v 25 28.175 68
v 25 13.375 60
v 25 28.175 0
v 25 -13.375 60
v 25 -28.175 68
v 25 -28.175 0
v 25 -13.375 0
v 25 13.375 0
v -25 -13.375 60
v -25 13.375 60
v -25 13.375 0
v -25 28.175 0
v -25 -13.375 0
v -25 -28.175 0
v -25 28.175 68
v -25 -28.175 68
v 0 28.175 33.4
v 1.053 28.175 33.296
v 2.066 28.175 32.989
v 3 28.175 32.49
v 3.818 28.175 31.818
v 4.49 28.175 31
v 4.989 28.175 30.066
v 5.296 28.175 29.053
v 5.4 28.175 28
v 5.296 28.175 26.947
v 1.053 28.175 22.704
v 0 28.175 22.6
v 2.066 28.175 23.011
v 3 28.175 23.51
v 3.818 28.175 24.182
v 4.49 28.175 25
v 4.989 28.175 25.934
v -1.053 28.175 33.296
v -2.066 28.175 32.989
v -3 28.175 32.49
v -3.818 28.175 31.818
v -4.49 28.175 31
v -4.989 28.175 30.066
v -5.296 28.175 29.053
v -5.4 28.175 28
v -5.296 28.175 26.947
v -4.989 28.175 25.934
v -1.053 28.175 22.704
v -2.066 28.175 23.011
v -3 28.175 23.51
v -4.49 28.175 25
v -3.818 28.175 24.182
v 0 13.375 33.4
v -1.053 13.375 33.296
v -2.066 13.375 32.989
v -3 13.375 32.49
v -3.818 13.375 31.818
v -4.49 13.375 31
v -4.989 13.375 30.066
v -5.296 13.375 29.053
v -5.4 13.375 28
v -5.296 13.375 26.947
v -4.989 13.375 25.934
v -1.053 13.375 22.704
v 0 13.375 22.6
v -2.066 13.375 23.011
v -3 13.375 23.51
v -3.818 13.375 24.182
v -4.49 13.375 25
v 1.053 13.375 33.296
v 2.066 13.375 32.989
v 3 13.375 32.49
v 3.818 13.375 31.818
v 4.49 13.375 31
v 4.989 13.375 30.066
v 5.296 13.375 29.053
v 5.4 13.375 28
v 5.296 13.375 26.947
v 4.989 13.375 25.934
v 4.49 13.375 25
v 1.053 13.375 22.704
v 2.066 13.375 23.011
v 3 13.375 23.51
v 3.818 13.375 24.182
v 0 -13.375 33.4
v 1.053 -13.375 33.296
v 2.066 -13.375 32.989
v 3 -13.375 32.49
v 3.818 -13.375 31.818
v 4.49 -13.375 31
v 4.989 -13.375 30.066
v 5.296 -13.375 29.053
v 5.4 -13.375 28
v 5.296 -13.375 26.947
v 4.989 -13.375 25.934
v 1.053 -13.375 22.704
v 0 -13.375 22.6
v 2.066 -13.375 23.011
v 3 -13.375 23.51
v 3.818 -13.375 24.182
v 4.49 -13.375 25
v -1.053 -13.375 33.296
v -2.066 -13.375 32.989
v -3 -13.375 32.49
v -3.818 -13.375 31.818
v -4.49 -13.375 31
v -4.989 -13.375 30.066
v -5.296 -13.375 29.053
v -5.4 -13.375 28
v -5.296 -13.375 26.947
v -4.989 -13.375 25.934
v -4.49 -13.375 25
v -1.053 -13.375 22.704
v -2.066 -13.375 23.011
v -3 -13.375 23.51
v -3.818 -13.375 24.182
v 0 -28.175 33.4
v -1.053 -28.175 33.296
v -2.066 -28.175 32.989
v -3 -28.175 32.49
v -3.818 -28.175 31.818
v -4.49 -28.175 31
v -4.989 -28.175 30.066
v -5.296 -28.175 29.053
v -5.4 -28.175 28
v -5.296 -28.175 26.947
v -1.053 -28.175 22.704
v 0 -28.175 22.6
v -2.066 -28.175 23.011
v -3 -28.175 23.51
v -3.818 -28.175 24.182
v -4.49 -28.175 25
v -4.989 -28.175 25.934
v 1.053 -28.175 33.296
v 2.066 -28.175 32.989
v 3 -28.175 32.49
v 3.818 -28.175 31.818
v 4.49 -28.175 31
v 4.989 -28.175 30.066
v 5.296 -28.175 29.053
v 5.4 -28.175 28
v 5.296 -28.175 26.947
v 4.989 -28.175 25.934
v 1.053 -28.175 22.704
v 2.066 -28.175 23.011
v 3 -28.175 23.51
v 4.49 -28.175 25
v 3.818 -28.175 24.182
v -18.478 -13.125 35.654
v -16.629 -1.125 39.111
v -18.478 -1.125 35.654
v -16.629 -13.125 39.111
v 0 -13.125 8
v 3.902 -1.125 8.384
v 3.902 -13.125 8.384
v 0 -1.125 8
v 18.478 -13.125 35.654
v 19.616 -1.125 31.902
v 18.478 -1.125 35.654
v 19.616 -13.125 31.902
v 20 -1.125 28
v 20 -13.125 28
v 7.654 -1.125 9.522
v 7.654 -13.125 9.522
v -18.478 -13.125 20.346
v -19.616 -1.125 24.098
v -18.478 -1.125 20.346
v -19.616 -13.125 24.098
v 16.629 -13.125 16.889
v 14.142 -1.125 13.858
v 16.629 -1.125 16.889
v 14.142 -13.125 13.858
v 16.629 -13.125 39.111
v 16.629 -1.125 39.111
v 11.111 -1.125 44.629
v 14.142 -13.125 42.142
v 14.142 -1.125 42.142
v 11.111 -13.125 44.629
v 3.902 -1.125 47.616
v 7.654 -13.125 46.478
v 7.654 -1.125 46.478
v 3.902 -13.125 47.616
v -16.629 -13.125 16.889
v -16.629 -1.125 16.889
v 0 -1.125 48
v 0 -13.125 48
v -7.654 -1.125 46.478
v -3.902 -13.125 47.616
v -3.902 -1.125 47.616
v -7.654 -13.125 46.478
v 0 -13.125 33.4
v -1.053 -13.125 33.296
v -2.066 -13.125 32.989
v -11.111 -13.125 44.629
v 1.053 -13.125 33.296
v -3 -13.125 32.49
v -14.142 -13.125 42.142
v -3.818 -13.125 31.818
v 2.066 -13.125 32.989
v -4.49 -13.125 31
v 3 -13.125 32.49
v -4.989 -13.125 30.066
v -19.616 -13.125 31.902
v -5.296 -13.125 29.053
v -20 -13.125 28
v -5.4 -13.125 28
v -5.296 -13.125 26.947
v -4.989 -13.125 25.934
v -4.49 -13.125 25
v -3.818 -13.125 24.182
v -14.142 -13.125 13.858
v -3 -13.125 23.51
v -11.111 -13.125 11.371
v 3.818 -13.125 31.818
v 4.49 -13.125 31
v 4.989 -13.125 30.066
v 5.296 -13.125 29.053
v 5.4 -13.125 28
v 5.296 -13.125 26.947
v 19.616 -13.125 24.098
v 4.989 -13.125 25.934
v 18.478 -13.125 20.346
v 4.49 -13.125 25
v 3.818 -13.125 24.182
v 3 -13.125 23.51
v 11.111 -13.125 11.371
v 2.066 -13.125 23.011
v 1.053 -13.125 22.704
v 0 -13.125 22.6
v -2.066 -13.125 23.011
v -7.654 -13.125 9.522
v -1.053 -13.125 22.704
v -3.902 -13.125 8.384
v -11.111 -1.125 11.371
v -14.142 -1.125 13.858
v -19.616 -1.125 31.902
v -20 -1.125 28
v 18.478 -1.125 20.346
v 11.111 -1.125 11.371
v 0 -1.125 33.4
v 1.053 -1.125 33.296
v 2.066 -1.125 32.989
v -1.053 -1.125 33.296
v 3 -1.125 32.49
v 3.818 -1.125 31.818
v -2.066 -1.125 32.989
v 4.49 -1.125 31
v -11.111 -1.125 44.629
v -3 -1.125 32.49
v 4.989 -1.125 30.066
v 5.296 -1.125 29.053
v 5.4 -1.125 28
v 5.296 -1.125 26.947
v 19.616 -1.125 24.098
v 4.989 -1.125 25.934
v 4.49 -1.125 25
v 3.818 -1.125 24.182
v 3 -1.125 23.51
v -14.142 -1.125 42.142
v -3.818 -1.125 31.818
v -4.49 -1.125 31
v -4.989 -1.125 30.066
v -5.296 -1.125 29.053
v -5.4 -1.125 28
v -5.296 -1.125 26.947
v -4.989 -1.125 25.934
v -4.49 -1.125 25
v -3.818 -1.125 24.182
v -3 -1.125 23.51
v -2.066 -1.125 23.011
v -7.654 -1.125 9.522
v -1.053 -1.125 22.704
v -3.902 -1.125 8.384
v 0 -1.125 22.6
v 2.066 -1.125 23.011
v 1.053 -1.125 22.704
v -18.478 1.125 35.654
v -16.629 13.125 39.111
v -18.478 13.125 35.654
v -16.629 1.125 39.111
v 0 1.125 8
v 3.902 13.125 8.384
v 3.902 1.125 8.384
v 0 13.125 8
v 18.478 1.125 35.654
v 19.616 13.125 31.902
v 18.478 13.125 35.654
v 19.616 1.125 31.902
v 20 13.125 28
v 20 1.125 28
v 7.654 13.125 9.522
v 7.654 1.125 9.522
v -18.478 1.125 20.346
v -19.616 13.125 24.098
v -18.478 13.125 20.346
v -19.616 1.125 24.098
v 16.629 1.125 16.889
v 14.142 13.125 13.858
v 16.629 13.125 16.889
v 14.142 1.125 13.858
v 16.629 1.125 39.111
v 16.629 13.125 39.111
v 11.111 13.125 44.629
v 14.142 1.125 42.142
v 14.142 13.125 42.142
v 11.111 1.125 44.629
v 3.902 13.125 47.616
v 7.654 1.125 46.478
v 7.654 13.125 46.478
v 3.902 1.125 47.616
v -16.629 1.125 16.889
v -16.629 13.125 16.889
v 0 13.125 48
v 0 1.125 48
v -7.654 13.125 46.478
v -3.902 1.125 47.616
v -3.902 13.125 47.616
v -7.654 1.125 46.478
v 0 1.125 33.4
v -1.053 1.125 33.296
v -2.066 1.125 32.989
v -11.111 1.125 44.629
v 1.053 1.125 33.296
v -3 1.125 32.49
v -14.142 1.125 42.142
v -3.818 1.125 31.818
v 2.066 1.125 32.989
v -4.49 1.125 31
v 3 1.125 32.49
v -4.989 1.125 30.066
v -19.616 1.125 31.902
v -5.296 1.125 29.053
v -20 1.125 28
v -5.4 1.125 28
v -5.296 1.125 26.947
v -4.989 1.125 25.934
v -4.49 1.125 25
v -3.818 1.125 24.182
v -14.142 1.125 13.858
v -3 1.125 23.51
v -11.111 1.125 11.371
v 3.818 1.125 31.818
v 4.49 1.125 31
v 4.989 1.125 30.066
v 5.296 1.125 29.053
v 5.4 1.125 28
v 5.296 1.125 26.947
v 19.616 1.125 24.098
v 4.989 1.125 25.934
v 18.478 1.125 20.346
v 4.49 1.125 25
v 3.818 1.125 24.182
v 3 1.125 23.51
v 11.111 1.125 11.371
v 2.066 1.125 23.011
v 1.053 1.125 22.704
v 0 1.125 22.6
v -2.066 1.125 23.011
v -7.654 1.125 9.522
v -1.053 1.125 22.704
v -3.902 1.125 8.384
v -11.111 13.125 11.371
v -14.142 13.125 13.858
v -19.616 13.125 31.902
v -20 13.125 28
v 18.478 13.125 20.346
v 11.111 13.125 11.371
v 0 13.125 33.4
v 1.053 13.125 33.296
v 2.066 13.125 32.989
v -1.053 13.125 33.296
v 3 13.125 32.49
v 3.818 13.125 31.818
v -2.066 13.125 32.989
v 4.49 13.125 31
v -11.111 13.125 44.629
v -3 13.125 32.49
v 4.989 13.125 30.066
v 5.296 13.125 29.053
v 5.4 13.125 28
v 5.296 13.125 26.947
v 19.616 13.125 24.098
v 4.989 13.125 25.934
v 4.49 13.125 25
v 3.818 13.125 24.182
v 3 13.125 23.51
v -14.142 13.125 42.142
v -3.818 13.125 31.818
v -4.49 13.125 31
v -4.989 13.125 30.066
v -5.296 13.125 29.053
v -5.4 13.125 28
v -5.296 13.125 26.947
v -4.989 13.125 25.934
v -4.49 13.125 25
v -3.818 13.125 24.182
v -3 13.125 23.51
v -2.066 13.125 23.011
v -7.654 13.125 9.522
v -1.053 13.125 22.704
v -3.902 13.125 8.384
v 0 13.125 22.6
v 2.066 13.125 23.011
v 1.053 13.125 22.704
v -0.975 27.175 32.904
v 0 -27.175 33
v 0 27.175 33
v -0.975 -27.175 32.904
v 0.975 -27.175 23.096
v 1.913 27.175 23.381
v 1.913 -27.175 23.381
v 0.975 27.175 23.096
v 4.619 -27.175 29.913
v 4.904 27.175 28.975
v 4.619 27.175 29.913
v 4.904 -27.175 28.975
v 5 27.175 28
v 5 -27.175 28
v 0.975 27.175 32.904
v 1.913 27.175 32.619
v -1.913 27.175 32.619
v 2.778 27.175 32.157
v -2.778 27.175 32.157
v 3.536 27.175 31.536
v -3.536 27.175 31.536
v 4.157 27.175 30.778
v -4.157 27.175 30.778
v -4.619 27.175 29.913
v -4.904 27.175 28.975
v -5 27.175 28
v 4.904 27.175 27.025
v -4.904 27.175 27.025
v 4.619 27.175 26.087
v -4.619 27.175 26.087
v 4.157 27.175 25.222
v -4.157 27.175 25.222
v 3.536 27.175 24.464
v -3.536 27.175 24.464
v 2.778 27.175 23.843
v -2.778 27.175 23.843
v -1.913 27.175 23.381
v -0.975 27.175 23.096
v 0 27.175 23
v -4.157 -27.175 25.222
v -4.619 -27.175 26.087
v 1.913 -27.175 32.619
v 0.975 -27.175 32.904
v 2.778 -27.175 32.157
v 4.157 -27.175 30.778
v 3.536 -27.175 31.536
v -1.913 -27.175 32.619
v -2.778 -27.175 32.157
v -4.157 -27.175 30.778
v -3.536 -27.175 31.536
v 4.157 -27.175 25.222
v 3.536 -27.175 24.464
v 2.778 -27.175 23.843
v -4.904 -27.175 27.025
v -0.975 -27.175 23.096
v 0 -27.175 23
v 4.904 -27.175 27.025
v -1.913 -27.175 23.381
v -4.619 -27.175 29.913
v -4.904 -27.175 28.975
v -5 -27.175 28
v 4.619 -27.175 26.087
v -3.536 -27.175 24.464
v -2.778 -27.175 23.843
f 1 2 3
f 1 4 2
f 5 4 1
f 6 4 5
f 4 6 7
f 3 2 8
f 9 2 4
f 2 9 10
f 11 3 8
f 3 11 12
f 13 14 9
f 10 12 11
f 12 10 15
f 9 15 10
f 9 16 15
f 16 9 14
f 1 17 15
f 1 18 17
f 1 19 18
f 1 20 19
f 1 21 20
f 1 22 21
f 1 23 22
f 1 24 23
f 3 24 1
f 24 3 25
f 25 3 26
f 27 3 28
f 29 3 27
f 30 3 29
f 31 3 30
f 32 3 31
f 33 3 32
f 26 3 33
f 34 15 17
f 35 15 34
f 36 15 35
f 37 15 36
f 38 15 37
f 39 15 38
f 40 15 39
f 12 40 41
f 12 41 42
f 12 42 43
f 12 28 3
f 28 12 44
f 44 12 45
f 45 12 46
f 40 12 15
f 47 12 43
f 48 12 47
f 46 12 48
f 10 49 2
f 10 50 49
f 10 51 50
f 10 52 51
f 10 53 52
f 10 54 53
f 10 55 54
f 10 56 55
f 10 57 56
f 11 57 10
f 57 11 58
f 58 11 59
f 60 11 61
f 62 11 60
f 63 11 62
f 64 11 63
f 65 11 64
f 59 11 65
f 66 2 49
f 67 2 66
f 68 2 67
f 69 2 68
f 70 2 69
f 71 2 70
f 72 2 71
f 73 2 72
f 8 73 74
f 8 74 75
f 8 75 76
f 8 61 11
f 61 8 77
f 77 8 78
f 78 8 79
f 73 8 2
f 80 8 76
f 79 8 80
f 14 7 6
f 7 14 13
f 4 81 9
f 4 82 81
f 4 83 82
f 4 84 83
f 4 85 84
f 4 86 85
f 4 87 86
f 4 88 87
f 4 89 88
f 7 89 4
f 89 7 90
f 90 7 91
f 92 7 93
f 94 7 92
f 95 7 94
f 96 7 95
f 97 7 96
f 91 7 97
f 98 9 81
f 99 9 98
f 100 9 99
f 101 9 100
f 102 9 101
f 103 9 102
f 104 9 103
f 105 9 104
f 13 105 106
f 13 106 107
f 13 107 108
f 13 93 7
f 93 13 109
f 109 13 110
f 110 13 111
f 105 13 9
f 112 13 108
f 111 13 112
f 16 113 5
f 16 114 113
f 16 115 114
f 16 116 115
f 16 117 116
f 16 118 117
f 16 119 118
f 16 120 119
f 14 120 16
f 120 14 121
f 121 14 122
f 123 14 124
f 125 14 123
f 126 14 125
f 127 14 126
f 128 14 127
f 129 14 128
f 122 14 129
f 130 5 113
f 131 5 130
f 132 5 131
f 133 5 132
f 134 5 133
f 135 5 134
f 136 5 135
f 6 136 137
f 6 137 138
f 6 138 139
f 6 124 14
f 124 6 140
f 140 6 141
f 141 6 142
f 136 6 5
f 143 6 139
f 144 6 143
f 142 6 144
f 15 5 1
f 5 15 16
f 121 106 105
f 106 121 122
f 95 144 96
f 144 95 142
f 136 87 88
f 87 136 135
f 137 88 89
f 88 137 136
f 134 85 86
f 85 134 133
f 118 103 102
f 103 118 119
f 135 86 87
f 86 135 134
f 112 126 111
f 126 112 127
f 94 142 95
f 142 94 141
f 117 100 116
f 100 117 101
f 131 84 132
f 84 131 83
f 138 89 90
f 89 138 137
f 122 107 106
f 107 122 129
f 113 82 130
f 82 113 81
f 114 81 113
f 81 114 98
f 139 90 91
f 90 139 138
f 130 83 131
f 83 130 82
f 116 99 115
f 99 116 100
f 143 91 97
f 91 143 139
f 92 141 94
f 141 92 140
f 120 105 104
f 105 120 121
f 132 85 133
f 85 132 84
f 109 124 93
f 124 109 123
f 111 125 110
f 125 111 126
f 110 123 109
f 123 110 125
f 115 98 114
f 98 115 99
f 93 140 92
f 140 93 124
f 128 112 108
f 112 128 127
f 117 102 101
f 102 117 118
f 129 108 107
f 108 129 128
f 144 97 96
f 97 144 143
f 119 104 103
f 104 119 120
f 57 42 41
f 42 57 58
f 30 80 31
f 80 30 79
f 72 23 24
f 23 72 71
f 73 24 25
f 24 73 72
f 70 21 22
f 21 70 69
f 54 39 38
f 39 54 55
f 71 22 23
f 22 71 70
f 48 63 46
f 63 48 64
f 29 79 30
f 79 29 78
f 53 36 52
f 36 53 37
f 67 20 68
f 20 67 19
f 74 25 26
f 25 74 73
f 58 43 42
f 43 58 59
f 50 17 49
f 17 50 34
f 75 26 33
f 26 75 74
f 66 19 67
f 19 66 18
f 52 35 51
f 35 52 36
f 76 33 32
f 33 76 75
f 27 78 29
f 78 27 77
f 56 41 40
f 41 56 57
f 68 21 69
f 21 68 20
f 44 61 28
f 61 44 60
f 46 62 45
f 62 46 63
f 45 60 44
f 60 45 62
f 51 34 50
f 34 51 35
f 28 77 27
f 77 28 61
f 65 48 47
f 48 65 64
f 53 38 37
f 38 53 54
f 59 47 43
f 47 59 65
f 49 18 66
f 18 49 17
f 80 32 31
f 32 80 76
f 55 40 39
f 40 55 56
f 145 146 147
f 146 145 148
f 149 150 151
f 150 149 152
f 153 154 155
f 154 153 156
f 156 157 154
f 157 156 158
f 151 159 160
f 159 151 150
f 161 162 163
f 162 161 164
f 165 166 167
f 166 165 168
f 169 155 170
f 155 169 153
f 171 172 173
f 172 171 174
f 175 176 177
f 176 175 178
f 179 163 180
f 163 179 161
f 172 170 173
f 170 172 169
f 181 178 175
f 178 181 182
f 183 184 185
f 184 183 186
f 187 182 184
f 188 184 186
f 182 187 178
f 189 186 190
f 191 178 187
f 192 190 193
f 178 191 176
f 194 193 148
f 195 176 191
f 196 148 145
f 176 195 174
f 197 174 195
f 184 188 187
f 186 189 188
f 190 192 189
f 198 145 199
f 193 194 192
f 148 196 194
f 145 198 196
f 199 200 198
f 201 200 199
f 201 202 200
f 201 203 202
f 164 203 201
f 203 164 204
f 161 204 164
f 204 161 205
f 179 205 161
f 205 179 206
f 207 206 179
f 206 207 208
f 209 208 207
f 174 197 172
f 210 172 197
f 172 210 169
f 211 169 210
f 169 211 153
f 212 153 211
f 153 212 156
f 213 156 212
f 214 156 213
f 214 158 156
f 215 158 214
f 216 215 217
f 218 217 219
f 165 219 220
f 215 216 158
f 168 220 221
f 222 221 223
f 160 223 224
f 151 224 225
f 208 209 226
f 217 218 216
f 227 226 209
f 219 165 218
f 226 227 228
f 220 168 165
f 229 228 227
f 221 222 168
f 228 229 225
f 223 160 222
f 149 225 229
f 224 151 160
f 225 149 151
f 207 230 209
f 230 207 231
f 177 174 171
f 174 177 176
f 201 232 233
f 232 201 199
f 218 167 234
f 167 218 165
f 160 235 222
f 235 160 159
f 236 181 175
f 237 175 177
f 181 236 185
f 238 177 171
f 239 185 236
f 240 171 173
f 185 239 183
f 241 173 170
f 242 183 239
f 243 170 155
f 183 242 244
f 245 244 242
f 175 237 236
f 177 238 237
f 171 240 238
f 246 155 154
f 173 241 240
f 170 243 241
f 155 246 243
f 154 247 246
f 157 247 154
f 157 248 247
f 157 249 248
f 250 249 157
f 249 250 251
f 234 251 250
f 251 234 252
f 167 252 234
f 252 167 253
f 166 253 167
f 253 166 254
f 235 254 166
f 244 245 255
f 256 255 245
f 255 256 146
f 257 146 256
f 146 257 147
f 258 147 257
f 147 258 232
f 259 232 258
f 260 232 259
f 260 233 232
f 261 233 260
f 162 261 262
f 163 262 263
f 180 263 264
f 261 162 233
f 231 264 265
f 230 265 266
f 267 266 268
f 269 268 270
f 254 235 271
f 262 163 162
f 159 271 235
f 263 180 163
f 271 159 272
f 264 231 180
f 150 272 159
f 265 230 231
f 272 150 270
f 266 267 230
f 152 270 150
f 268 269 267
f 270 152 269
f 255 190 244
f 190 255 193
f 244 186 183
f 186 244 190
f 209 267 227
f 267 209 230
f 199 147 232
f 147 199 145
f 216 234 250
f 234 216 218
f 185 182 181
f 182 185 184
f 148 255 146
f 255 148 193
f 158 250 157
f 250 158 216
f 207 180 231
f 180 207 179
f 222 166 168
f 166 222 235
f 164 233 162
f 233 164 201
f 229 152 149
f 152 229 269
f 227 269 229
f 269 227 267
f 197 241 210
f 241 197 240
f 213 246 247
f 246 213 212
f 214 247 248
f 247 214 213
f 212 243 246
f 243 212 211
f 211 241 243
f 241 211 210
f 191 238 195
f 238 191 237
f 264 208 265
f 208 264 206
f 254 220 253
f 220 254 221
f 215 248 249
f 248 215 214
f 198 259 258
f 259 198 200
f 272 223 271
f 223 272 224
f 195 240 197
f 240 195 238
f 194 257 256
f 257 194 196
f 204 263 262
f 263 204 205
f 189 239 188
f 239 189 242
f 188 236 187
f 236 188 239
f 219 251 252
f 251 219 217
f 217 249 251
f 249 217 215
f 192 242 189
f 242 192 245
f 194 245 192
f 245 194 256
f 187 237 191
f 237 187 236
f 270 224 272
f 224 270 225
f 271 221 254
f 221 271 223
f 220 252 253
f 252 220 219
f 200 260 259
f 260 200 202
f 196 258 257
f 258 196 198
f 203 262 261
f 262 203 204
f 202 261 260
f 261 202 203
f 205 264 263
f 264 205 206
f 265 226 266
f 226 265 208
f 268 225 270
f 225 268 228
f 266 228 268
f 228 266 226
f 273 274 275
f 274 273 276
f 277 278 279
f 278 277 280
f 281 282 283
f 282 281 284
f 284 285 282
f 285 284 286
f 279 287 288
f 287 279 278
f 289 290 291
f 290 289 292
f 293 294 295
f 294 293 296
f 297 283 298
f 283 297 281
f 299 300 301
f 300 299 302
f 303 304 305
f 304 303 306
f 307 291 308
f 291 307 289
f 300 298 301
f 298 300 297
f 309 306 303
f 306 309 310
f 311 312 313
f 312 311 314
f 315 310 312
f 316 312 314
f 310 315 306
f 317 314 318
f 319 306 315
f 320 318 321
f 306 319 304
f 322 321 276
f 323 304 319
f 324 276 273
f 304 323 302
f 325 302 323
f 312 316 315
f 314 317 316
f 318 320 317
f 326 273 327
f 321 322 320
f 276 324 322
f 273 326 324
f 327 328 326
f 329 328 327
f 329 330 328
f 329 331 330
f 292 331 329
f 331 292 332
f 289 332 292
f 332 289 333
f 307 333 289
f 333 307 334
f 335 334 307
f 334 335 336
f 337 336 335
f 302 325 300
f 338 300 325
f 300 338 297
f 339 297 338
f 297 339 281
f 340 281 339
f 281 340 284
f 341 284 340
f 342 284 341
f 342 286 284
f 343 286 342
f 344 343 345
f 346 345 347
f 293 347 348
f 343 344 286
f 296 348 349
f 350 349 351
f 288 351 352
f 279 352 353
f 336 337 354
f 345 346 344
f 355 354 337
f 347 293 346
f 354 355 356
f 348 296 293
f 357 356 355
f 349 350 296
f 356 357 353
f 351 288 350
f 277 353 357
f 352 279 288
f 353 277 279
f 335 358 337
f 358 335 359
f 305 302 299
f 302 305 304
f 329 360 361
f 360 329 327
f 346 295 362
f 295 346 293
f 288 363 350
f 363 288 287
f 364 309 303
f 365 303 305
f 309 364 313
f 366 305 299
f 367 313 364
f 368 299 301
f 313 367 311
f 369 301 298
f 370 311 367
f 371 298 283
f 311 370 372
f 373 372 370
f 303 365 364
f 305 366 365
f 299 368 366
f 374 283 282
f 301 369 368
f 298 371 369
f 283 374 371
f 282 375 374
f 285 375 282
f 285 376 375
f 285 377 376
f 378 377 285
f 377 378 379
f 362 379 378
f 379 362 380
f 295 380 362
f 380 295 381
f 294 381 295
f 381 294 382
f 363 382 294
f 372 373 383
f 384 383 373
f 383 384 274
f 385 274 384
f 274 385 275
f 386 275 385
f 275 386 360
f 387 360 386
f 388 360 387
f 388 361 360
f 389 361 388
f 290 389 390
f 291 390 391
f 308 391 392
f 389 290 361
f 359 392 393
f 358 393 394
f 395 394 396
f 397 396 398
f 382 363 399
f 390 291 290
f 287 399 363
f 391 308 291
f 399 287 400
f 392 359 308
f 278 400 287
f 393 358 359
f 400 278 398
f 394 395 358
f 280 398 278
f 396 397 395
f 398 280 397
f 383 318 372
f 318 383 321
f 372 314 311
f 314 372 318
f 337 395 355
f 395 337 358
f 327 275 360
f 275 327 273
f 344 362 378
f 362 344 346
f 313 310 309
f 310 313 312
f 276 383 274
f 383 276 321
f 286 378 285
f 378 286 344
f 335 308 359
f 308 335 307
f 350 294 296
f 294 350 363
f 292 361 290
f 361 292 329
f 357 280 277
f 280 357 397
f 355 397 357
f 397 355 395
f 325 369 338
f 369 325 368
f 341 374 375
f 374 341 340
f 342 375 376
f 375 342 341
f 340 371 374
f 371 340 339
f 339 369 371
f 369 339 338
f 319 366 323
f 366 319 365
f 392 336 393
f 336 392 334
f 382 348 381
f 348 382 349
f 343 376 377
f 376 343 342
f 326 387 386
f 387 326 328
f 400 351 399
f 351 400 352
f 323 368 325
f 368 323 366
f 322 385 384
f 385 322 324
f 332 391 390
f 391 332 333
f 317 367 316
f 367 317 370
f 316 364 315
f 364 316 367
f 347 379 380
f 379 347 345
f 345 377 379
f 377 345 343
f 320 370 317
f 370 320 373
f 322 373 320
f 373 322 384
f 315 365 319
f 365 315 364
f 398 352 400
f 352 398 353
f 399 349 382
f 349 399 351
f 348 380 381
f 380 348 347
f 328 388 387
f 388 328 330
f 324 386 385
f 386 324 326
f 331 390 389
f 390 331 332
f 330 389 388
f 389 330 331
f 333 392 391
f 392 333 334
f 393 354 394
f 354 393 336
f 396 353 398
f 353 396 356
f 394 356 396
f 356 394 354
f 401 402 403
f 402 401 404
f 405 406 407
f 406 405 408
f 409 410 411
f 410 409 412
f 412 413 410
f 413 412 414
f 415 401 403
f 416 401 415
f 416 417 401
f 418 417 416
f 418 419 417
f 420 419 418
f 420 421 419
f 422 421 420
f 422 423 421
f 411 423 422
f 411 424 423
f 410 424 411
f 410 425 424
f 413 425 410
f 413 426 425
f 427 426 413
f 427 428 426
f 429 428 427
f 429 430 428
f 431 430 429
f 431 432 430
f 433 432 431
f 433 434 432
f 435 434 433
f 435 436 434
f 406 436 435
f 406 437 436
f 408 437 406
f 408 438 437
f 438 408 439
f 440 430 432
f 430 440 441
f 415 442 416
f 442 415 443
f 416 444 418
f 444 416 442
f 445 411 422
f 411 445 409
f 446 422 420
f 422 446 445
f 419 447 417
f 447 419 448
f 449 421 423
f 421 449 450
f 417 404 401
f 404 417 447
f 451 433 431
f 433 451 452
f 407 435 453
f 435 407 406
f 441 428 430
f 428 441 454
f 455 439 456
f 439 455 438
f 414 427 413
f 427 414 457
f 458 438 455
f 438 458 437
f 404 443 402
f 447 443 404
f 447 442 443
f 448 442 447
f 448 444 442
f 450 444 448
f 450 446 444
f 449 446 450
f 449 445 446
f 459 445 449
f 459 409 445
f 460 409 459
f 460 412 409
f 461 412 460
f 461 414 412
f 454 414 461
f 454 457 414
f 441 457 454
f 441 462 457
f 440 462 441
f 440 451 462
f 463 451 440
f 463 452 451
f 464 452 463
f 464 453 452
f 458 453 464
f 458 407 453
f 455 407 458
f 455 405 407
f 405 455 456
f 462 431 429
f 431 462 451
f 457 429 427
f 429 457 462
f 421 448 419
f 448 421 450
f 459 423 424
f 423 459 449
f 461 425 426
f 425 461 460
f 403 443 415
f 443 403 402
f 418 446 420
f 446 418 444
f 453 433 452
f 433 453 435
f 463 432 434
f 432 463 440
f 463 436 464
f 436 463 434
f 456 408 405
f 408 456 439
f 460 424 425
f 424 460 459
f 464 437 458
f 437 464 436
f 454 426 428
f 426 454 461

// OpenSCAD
$fn = 32;

// ------------------------------------------------------------------------
// Trolley wheel set: wheels d40, fork 60 mm tall
// Every part is its own module, assembly() places every instance.
// ------------------------------------------------------------------------

// --- part 1 ---
module trolley_fork() {
  difference() {
    union() {
      translate([-25, 13.375, 0]) cube([50, 14.8, 60]);
      translate([-25, -28.175, 0]) cube([50, 14.8, 60]);
      translate([-25, -28.175, 60]) cube([50, 56.35, 8]);
    }
    translate([0, -20.775, 28]) rotate([90, 0, 0]) cylinder(h = 16.8, d = 10.8, center = true);
    translate([0, 20.775, 28]) rotate([90, 0, 0]) cylinder(h = 16.8, d = 10.8, center = true);
  }
}

// --- part 2 ---
module trolley_wheel() {
  difference() {
      translate([0, 0, 0]) cylinder(h = 12, d = 40);
      translate([0, 0, -1]) cylinder(h = 14, d = 10.8);
    }
}

// --- part 3 ---
module trolley_axle() {
  translate([0, 0, -27.175]) cylinder(h = 54.35, d = 10);
}

// --- assembly ---
module assembly() {
  color([0.80, 0.24, 0.20]) translate([0, 0, 0]) rotate([0, 0, 0]) trolley_fork();
  color([0.20, 0.45, 0.75]) translate([0, -1.125, 28]) rotate([90, 0, 0]) trolley_wheel();
  color([0.25, 0.62, 0.32]) translate([0, 13.125, 28]) rotate([90, 0, 0]) trolley_wheel();
  color([0.92, 0.70, 0.18]) translate([0, 0, 28]) rotate([90, 0, 0]) trolley_axle();
}

assembly();
